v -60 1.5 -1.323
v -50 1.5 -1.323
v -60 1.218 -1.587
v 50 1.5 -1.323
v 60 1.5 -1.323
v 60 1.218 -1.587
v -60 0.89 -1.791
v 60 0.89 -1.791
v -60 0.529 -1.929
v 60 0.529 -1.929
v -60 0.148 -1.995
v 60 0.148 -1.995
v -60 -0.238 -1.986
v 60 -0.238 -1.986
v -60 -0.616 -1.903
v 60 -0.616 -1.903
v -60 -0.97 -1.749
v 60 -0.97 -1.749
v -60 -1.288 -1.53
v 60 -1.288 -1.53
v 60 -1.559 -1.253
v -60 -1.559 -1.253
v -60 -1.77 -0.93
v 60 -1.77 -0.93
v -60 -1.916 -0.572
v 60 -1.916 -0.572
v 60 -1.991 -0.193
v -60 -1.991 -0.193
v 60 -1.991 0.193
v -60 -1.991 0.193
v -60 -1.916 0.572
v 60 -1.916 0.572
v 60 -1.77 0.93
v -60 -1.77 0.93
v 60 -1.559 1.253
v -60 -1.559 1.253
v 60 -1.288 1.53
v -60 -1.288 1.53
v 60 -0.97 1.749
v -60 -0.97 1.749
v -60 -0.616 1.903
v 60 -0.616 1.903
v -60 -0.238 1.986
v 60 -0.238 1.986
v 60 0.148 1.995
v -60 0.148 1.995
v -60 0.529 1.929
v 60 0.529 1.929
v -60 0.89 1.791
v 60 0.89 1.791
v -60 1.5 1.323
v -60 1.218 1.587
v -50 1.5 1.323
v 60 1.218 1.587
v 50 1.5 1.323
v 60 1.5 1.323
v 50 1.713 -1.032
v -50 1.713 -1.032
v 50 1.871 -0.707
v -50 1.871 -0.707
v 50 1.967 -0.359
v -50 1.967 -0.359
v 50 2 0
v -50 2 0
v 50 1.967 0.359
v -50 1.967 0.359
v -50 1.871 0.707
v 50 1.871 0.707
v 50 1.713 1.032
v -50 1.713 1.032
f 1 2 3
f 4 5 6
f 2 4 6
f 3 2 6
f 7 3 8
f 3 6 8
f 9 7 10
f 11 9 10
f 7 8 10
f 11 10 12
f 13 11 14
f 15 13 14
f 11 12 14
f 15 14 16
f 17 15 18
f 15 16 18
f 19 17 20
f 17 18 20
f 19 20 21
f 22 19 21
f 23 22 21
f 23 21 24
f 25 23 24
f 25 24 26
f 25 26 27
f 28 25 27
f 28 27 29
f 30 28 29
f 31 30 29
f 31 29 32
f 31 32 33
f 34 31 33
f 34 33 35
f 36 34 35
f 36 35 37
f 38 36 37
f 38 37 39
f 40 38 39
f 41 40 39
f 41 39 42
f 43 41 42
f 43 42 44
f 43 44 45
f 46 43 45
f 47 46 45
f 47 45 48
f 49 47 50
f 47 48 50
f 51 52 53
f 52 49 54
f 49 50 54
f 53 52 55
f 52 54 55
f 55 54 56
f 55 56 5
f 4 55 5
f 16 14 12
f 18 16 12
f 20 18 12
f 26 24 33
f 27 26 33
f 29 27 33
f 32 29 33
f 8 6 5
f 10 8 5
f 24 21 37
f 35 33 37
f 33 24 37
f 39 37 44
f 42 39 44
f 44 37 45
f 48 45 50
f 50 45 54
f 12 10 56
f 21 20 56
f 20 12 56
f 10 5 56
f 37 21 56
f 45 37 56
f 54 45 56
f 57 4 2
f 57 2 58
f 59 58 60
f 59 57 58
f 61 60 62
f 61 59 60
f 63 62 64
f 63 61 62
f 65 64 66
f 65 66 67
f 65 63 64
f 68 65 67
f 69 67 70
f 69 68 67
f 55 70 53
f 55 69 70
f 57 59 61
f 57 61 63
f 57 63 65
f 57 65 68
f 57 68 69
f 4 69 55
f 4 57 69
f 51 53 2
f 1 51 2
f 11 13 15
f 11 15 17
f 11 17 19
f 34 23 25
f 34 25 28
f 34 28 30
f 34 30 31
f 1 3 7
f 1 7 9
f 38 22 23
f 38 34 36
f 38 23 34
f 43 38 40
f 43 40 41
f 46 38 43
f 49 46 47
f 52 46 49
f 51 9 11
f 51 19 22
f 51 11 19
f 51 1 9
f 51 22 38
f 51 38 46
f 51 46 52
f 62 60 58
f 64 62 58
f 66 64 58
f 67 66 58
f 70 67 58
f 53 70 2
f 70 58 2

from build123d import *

# Parameters (mm, degrees)
BOSS_EXTRUDE1_DEPTH = 60
SKETCH2_R           = 2
BOSS_EXTRUDE2_DEPTH = 50


with BuildPart() as part:
    # Sketch1 → Boss-Extrude1 (new body, symmetric)
    with BuildSketch(Plane(origin=(0, 0, 0), x_dir=(0, 0, -1), z_dir=(1, 0, 0))):
        with BuildLine():
            Line((-1.322875656, 1.5), (1.322875656, 1.5))
            ThreePointArc((1.322875656, 1.5), (0, -2), (-1.322875656, 1.5))
        make_face()
    extrude(amount=BOSS_EXTRUDE1_DEPTH, both=True)

    # Sketch2 → Boss-Extrude2 (add, symmetric)
    with BuildSketch(Plane(origin=(0, 0, 0), x_dir=(0, 0, -1), z_dir=(1, 0, 0))):
        Circle(SKETCH2_R)
    extrude(amount=BOSS_EXTRUDE2_DEPTH, both=True)


solid = part.part
